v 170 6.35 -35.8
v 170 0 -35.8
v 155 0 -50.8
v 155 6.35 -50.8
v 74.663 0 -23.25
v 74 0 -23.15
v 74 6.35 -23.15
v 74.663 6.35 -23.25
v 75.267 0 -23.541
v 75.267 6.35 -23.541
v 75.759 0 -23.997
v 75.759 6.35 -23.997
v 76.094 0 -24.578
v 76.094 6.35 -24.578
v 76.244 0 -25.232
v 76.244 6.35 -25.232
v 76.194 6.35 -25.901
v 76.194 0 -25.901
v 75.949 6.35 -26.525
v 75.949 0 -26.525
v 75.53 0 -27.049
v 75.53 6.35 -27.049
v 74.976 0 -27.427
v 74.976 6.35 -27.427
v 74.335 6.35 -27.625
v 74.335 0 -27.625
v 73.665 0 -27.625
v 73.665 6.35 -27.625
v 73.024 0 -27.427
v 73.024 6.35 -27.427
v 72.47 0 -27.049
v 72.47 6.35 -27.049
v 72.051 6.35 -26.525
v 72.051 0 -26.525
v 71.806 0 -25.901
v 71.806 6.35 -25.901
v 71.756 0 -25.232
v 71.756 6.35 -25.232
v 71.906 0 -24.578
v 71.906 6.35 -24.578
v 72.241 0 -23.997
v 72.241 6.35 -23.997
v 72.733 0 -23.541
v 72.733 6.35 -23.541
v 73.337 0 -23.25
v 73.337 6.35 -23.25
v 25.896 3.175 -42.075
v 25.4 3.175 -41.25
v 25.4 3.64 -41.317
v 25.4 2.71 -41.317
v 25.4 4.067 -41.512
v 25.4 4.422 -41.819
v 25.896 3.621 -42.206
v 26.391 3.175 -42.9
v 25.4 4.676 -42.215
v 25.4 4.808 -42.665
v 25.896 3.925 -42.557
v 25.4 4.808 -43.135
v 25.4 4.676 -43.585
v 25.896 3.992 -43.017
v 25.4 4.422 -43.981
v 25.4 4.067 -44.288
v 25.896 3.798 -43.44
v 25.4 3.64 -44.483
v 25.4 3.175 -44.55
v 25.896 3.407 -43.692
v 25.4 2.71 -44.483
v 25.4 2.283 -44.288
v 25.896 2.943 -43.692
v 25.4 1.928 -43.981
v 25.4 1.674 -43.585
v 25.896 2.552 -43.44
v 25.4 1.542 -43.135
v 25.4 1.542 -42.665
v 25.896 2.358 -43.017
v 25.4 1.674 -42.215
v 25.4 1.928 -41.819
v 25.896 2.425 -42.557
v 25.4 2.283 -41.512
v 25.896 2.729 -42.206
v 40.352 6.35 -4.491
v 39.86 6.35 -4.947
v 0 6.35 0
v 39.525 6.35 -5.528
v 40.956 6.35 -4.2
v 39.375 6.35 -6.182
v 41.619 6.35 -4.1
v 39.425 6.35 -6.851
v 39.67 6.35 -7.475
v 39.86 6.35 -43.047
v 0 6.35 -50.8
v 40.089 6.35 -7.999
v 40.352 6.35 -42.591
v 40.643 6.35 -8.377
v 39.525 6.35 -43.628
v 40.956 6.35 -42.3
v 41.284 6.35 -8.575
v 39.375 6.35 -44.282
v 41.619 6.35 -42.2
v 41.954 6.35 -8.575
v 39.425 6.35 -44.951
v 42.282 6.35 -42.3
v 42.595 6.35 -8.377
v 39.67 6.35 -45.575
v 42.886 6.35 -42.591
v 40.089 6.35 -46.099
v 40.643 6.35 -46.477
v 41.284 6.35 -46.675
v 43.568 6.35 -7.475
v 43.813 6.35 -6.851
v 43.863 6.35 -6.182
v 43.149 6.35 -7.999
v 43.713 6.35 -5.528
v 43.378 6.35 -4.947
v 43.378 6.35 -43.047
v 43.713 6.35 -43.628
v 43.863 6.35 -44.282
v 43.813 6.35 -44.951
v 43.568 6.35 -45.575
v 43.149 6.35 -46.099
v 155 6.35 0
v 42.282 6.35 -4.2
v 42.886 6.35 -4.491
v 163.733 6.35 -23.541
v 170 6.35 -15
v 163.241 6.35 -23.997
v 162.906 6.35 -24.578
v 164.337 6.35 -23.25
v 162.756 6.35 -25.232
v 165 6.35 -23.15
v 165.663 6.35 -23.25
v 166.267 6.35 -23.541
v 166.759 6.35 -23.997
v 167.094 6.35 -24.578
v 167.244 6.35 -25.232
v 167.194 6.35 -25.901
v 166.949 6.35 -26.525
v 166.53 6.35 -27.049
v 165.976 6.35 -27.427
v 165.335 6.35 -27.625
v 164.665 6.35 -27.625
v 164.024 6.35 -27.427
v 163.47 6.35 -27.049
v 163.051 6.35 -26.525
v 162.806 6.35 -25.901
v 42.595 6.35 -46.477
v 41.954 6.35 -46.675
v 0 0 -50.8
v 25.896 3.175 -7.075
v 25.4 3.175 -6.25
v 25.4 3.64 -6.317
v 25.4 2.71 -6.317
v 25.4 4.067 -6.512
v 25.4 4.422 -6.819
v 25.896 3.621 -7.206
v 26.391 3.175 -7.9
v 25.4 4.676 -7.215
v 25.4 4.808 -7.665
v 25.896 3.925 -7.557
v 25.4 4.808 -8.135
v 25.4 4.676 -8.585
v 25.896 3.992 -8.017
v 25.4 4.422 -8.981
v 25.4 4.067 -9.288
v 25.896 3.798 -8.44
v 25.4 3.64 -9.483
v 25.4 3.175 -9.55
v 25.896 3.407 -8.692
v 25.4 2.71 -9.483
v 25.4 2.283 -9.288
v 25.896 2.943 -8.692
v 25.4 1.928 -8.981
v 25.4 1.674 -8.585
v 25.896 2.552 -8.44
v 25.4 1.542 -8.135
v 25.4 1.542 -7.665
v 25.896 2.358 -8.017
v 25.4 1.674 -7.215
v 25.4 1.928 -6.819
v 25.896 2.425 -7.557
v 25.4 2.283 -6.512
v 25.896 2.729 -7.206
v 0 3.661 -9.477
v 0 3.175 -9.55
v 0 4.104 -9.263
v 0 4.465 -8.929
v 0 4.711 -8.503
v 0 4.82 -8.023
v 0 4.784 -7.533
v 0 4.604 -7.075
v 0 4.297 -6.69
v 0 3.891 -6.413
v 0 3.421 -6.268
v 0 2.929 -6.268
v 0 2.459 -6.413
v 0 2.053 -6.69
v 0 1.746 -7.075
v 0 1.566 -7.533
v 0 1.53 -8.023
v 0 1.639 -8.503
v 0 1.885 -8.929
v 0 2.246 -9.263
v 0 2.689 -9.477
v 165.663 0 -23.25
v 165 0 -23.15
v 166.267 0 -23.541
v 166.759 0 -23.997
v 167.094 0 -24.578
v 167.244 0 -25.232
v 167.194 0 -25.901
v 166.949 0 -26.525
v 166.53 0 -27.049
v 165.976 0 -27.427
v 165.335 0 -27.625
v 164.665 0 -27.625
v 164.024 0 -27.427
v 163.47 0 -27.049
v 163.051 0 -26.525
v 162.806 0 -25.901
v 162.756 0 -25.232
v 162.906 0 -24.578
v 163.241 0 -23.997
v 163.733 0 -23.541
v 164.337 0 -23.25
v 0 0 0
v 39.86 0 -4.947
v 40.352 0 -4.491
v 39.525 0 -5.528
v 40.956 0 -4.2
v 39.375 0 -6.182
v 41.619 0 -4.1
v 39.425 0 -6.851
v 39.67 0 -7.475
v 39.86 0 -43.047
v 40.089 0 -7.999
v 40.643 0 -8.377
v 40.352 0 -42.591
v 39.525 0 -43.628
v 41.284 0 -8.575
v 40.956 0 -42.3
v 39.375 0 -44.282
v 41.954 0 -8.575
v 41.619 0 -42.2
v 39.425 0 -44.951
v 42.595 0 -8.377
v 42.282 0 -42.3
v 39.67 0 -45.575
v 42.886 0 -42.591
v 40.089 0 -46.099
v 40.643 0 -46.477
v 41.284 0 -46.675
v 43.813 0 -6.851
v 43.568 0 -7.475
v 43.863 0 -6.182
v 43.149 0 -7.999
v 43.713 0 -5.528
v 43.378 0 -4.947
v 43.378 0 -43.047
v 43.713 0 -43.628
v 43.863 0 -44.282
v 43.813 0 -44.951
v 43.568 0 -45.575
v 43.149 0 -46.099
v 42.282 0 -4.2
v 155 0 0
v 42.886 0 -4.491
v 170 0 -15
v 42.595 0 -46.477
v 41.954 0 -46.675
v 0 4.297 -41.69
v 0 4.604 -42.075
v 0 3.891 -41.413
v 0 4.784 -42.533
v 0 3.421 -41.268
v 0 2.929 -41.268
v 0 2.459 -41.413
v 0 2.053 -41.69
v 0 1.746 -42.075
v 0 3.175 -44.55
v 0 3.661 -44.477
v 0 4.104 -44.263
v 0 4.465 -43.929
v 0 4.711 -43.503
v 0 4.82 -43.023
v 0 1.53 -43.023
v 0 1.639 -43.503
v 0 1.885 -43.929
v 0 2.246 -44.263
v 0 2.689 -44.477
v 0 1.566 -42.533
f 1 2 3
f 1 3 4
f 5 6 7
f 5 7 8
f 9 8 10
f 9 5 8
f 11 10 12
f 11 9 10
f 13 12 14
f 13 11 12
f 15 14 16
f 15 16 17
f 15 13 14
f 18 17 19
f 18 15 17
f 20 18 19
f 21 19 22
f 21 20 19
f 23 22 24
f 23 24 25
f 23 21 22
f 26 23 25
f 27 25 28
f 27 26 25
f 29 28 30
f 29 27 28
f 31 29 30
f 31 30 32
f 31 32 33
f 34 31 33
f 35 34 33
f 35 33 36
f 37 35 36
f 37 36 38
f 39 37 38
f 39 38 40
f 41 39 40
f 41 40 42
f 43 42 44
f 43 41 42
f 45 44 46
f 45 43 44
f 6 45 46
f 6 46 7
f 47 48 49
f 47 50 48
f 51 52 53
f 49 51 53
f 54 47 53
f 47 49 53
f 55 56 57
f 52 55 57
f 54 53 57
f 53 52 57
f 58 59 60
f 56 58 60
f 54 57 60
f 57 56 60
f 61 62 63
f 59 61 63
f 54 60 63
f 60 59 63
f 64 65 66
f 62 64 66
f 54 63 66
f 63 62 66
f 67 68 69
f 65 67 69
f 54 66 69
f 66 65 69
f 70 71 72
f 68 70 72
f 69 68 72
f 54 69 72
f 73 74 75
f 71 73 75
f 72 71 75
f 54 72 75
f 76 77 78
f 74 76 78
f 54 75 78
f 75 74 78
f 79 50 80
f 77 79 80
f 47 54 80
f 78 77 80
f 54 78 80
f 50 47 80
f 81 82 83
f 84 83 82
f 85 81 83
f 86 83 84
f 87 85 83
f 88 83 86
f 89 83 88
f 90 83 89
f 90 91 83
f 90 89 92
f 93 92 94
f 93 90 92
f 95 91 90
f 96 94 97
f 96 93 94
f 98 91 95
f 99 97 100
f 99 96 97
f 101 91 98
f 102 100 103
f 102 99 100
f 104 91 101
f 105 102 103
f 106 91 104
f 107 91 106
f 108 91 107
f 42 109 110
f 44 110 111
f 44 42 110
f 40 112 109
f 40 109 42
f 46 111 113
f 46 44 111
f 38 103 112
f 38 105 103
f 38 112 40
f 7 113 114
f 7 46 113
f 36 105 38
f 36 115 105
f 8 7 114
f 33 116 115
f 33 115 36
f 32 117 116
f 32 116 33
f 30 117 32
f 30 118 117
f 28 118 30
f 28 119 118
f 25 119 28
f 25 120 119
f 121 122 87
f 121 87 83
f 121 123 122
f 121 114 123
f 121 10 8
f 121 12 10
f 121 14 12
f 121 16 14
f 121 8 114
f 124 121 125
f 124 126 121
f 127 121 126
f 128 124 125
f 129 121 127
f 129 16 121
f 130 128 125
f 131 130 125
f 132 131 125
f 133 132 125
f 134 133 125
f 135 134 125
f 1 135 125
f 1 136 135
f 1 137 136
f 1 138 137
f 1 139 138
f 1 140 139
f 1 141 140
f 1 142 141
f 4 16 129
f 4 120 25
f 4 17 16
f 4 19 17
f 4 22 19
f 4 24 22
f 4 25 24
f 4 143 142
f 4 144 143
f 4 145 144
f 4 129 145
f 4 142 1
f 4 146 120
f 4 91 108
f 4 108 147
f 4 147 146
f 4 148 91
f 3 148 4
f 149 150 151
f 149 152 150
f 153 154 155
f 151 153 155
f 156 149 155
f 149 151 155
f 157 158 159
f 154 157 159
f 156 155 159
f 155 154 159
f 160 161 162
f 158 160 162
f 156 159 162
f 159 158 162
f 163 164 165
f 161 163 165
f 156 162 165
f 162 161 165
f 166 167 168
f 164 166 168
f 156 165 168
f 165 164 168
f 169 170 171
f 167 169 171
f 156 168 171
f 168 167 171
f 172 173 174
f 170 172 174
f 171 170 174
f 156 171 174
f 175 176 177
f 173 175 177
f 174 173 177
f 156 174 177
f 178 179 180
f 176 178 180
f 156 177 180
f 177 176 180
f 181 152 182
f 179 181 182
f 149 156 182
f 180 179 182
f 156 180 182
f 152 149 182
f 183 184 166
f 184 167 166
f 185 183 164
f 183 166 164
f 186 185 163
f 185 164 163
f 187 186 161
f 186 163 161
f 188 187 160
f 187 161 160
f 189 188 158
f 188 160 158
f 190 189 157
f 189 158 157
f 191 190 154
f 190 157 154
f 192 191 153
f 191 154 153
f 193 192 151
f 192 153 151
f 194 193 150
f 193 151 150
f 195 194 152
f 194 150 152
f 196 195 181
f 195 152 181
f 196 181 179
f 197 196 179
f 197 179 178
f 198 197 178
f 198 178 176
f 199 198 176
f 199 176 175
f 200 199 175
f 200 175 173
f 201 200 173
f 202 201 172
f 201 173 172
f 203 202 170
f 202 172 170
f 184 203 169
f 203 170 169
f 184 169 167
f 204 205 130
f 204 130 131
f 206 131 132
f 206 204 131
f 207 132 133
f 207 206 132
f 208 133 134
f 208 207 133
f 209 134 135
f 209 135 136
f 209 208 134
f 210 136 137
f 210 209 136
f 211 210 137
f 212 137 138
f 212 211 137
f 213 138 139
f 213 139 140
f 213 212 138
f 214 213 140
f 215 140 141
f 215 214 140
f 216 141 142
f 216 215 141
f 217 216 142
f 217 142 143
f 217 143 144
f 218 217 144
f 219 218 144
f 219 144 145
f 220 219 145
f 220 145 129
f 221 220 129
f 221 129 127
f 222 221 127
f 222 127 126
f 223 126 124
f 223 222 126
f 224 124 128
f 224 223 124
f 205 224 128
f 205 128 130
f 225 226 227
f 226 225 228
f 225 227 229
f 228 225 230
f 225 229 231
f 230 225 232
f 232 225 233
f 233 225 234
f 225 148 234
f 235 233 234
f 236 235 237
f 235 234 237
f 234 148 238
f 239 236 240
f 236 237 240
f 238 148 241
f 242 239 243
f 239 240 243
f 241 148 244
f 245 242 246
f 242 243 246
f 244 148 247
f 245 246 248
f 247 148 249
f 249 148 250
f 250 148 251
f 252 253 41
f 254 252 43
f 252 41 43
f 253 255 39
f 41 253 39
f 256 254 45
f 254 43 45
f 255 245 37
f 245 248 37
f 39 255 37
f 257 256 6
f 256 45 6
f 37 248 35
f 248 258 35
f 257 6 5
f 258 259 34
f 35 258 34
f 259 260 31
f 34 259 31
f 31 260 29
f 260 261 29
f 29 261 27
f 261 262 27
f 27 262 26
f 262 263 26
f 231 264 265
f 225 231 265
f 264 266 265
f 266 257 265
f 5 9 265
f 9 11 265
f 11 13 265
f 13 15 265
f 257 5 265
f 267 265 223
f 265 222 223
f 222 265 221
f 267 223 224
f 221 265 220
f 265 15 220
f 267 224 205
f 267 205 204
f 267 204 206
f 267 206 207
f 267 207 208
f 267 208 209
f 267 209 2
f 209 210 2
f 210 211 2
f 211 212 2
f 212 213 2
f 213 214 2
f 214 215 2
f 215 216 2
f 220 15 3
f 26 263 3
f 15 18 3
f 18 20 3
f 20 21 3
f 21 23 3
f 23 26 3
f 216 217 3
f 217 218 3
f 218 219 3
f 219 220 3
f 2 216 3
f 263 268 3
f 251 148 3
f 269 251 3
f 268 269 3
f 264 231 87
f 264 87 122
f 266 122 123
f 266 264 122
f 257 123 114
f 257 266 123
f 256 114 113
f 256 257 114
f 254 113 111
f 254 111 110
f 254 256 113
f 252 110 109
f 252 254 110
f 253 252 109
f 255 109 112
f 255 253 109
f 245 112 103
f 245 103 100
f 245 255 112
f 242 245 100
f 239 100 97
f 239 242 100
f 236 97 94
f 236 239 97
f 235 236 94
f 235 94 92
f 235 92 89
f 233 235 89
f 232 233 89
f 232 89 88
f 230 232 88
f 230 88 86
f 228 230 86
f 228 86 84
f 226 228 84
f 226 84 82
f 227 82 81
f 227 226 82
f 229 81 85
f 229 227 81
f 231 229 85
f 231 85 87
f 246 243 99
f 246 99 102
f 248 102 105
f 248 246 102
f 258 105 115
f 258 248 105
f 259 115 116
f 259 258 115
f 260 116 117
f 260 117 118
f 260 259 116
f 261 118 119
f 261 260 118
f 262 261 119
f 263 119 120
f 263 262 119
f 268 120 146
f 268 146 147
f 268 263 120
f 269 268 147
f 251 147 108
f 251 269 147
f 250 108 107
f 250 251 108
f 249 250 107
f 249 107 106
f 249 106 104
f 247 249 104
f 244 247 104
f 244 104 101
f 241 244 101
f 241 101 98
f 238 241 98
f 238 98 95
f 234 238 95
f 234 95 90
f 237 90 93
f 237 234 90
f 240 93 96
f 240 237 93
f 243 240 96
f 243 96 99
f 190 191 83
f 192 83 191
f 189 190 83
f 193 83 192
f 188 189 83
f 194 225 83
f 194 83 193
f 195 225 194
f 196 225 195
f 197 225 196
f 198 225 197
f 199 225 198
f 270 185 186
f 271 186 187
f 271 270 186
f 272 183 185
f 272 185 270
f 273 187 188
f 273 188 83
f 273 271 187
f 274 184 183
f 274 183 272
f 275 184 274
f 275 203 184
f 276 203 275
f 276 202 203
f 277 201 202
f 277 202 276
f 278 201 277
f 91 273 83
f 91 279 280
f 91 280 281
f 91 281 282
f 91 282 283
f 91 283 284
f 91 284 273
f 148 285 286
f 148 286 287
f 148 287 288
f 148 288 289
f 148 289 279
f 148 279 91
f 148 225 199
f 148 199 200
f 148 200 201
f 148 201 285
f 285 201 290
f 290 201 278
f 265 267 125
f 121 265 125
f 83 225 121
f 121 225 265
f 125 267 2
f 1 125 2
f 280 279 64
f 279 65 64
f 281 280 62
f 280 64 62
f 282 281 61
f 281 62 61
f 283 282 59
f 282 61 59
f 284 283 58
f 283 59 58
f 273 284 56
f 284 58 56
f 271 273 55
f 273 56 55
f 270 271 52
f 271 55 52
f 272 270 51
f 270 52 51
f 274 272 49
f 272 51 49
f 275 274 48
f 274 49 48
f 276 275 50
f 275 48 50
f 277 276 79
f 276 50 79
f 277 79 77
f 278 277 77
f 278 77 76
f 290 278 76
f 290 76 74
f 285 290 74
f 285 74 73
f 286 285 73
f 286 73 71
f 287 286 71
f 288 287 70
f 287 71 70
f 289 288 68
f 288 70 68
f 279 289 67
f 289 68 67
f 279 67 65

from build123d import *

# Parameters (mm, degrees)
SKETCH1_W                 = 170
SKETCH1_H                 = 50.8
SKETCH1_R                 = 2.25
BOSS_EXTRUDE1_DEPTH       = 6.35
CHAMFER1_SIZE             = 15
M4X0_7_TAPPED_HOLE1_D     = 3.3
M4X0_7_TAPPED_HOLE1_DEPTH = 25.4
M4X0_7_TAPPED_HOLE1_TIP   = 0.991420021


with BuildPart() as part:
    # Sketch1 → Boss-Extrude1 (new body)
    with BuildSketch(Plane(origin=(0, 0, 0), x_dir=(1, 0, 0), z_dir=(0, 1, 0))):
        with Locations((85, 25.4)):
            Rectangle(SKETCH1_W, SKETCH1_H)
        with Locations(Location((165, 25.4, 0), (0, 0, 270))):
            Circle(SKETCH1_R, mode=Mode.SUBTRACT)
        with Locations(Location((73.999999882, 25.4, 0), (0, 0, 270))):
            Circle(SKETCH1_R, mode=Mode.SUBTRACT)
        with Locations(Location((41.619, 44.45, 0), (0, 0, 270))):
            Circle(SKETCH1_R, mode=Mode.SUBTRACT)
        with Locations(Location((41.619, 6.35, 0), (0, 0, 270))):
            Circle(SKETCH1_R, mode=Mode.SUBTRACT)
    extrude(amount=BOSS_EXTRUDE1_DEPTH)

    # Chamfer1
    chamfer1_edges = [part.edges().sort_by_distance(p)[0] for p in [
        (170, 3.175, -50.8),
        (170, 3.175, 0),
    ]]
    chamfer(chamfer1_edges, length=CHAMFER1_SIZE)

    # M4x0.7 Tapped Hole1
    with Locations(Plane.ZY):
        with Locations((-42.9, 3.175), (-7.9, 3.175)):
            Hole(M4X0_7_TAPPED_HOLE1_D / 2, depth=M4X0_7_TAPPED_HOLE1_DEPTH)
            with Locations((0, 0, -(M4X0_7_TAPPED_HOLE1_DEPTH + M4X0_7_TAPPED_HOLE1_TIP / 2))):  # 118° drill point
                Cone(0, M4X0_7_TAPPED_HOLE1_D / 2, M4X0_7_TAPPED_HOLE1_TIP, mode=Mode.SUBTRACT)


solid = part.part
